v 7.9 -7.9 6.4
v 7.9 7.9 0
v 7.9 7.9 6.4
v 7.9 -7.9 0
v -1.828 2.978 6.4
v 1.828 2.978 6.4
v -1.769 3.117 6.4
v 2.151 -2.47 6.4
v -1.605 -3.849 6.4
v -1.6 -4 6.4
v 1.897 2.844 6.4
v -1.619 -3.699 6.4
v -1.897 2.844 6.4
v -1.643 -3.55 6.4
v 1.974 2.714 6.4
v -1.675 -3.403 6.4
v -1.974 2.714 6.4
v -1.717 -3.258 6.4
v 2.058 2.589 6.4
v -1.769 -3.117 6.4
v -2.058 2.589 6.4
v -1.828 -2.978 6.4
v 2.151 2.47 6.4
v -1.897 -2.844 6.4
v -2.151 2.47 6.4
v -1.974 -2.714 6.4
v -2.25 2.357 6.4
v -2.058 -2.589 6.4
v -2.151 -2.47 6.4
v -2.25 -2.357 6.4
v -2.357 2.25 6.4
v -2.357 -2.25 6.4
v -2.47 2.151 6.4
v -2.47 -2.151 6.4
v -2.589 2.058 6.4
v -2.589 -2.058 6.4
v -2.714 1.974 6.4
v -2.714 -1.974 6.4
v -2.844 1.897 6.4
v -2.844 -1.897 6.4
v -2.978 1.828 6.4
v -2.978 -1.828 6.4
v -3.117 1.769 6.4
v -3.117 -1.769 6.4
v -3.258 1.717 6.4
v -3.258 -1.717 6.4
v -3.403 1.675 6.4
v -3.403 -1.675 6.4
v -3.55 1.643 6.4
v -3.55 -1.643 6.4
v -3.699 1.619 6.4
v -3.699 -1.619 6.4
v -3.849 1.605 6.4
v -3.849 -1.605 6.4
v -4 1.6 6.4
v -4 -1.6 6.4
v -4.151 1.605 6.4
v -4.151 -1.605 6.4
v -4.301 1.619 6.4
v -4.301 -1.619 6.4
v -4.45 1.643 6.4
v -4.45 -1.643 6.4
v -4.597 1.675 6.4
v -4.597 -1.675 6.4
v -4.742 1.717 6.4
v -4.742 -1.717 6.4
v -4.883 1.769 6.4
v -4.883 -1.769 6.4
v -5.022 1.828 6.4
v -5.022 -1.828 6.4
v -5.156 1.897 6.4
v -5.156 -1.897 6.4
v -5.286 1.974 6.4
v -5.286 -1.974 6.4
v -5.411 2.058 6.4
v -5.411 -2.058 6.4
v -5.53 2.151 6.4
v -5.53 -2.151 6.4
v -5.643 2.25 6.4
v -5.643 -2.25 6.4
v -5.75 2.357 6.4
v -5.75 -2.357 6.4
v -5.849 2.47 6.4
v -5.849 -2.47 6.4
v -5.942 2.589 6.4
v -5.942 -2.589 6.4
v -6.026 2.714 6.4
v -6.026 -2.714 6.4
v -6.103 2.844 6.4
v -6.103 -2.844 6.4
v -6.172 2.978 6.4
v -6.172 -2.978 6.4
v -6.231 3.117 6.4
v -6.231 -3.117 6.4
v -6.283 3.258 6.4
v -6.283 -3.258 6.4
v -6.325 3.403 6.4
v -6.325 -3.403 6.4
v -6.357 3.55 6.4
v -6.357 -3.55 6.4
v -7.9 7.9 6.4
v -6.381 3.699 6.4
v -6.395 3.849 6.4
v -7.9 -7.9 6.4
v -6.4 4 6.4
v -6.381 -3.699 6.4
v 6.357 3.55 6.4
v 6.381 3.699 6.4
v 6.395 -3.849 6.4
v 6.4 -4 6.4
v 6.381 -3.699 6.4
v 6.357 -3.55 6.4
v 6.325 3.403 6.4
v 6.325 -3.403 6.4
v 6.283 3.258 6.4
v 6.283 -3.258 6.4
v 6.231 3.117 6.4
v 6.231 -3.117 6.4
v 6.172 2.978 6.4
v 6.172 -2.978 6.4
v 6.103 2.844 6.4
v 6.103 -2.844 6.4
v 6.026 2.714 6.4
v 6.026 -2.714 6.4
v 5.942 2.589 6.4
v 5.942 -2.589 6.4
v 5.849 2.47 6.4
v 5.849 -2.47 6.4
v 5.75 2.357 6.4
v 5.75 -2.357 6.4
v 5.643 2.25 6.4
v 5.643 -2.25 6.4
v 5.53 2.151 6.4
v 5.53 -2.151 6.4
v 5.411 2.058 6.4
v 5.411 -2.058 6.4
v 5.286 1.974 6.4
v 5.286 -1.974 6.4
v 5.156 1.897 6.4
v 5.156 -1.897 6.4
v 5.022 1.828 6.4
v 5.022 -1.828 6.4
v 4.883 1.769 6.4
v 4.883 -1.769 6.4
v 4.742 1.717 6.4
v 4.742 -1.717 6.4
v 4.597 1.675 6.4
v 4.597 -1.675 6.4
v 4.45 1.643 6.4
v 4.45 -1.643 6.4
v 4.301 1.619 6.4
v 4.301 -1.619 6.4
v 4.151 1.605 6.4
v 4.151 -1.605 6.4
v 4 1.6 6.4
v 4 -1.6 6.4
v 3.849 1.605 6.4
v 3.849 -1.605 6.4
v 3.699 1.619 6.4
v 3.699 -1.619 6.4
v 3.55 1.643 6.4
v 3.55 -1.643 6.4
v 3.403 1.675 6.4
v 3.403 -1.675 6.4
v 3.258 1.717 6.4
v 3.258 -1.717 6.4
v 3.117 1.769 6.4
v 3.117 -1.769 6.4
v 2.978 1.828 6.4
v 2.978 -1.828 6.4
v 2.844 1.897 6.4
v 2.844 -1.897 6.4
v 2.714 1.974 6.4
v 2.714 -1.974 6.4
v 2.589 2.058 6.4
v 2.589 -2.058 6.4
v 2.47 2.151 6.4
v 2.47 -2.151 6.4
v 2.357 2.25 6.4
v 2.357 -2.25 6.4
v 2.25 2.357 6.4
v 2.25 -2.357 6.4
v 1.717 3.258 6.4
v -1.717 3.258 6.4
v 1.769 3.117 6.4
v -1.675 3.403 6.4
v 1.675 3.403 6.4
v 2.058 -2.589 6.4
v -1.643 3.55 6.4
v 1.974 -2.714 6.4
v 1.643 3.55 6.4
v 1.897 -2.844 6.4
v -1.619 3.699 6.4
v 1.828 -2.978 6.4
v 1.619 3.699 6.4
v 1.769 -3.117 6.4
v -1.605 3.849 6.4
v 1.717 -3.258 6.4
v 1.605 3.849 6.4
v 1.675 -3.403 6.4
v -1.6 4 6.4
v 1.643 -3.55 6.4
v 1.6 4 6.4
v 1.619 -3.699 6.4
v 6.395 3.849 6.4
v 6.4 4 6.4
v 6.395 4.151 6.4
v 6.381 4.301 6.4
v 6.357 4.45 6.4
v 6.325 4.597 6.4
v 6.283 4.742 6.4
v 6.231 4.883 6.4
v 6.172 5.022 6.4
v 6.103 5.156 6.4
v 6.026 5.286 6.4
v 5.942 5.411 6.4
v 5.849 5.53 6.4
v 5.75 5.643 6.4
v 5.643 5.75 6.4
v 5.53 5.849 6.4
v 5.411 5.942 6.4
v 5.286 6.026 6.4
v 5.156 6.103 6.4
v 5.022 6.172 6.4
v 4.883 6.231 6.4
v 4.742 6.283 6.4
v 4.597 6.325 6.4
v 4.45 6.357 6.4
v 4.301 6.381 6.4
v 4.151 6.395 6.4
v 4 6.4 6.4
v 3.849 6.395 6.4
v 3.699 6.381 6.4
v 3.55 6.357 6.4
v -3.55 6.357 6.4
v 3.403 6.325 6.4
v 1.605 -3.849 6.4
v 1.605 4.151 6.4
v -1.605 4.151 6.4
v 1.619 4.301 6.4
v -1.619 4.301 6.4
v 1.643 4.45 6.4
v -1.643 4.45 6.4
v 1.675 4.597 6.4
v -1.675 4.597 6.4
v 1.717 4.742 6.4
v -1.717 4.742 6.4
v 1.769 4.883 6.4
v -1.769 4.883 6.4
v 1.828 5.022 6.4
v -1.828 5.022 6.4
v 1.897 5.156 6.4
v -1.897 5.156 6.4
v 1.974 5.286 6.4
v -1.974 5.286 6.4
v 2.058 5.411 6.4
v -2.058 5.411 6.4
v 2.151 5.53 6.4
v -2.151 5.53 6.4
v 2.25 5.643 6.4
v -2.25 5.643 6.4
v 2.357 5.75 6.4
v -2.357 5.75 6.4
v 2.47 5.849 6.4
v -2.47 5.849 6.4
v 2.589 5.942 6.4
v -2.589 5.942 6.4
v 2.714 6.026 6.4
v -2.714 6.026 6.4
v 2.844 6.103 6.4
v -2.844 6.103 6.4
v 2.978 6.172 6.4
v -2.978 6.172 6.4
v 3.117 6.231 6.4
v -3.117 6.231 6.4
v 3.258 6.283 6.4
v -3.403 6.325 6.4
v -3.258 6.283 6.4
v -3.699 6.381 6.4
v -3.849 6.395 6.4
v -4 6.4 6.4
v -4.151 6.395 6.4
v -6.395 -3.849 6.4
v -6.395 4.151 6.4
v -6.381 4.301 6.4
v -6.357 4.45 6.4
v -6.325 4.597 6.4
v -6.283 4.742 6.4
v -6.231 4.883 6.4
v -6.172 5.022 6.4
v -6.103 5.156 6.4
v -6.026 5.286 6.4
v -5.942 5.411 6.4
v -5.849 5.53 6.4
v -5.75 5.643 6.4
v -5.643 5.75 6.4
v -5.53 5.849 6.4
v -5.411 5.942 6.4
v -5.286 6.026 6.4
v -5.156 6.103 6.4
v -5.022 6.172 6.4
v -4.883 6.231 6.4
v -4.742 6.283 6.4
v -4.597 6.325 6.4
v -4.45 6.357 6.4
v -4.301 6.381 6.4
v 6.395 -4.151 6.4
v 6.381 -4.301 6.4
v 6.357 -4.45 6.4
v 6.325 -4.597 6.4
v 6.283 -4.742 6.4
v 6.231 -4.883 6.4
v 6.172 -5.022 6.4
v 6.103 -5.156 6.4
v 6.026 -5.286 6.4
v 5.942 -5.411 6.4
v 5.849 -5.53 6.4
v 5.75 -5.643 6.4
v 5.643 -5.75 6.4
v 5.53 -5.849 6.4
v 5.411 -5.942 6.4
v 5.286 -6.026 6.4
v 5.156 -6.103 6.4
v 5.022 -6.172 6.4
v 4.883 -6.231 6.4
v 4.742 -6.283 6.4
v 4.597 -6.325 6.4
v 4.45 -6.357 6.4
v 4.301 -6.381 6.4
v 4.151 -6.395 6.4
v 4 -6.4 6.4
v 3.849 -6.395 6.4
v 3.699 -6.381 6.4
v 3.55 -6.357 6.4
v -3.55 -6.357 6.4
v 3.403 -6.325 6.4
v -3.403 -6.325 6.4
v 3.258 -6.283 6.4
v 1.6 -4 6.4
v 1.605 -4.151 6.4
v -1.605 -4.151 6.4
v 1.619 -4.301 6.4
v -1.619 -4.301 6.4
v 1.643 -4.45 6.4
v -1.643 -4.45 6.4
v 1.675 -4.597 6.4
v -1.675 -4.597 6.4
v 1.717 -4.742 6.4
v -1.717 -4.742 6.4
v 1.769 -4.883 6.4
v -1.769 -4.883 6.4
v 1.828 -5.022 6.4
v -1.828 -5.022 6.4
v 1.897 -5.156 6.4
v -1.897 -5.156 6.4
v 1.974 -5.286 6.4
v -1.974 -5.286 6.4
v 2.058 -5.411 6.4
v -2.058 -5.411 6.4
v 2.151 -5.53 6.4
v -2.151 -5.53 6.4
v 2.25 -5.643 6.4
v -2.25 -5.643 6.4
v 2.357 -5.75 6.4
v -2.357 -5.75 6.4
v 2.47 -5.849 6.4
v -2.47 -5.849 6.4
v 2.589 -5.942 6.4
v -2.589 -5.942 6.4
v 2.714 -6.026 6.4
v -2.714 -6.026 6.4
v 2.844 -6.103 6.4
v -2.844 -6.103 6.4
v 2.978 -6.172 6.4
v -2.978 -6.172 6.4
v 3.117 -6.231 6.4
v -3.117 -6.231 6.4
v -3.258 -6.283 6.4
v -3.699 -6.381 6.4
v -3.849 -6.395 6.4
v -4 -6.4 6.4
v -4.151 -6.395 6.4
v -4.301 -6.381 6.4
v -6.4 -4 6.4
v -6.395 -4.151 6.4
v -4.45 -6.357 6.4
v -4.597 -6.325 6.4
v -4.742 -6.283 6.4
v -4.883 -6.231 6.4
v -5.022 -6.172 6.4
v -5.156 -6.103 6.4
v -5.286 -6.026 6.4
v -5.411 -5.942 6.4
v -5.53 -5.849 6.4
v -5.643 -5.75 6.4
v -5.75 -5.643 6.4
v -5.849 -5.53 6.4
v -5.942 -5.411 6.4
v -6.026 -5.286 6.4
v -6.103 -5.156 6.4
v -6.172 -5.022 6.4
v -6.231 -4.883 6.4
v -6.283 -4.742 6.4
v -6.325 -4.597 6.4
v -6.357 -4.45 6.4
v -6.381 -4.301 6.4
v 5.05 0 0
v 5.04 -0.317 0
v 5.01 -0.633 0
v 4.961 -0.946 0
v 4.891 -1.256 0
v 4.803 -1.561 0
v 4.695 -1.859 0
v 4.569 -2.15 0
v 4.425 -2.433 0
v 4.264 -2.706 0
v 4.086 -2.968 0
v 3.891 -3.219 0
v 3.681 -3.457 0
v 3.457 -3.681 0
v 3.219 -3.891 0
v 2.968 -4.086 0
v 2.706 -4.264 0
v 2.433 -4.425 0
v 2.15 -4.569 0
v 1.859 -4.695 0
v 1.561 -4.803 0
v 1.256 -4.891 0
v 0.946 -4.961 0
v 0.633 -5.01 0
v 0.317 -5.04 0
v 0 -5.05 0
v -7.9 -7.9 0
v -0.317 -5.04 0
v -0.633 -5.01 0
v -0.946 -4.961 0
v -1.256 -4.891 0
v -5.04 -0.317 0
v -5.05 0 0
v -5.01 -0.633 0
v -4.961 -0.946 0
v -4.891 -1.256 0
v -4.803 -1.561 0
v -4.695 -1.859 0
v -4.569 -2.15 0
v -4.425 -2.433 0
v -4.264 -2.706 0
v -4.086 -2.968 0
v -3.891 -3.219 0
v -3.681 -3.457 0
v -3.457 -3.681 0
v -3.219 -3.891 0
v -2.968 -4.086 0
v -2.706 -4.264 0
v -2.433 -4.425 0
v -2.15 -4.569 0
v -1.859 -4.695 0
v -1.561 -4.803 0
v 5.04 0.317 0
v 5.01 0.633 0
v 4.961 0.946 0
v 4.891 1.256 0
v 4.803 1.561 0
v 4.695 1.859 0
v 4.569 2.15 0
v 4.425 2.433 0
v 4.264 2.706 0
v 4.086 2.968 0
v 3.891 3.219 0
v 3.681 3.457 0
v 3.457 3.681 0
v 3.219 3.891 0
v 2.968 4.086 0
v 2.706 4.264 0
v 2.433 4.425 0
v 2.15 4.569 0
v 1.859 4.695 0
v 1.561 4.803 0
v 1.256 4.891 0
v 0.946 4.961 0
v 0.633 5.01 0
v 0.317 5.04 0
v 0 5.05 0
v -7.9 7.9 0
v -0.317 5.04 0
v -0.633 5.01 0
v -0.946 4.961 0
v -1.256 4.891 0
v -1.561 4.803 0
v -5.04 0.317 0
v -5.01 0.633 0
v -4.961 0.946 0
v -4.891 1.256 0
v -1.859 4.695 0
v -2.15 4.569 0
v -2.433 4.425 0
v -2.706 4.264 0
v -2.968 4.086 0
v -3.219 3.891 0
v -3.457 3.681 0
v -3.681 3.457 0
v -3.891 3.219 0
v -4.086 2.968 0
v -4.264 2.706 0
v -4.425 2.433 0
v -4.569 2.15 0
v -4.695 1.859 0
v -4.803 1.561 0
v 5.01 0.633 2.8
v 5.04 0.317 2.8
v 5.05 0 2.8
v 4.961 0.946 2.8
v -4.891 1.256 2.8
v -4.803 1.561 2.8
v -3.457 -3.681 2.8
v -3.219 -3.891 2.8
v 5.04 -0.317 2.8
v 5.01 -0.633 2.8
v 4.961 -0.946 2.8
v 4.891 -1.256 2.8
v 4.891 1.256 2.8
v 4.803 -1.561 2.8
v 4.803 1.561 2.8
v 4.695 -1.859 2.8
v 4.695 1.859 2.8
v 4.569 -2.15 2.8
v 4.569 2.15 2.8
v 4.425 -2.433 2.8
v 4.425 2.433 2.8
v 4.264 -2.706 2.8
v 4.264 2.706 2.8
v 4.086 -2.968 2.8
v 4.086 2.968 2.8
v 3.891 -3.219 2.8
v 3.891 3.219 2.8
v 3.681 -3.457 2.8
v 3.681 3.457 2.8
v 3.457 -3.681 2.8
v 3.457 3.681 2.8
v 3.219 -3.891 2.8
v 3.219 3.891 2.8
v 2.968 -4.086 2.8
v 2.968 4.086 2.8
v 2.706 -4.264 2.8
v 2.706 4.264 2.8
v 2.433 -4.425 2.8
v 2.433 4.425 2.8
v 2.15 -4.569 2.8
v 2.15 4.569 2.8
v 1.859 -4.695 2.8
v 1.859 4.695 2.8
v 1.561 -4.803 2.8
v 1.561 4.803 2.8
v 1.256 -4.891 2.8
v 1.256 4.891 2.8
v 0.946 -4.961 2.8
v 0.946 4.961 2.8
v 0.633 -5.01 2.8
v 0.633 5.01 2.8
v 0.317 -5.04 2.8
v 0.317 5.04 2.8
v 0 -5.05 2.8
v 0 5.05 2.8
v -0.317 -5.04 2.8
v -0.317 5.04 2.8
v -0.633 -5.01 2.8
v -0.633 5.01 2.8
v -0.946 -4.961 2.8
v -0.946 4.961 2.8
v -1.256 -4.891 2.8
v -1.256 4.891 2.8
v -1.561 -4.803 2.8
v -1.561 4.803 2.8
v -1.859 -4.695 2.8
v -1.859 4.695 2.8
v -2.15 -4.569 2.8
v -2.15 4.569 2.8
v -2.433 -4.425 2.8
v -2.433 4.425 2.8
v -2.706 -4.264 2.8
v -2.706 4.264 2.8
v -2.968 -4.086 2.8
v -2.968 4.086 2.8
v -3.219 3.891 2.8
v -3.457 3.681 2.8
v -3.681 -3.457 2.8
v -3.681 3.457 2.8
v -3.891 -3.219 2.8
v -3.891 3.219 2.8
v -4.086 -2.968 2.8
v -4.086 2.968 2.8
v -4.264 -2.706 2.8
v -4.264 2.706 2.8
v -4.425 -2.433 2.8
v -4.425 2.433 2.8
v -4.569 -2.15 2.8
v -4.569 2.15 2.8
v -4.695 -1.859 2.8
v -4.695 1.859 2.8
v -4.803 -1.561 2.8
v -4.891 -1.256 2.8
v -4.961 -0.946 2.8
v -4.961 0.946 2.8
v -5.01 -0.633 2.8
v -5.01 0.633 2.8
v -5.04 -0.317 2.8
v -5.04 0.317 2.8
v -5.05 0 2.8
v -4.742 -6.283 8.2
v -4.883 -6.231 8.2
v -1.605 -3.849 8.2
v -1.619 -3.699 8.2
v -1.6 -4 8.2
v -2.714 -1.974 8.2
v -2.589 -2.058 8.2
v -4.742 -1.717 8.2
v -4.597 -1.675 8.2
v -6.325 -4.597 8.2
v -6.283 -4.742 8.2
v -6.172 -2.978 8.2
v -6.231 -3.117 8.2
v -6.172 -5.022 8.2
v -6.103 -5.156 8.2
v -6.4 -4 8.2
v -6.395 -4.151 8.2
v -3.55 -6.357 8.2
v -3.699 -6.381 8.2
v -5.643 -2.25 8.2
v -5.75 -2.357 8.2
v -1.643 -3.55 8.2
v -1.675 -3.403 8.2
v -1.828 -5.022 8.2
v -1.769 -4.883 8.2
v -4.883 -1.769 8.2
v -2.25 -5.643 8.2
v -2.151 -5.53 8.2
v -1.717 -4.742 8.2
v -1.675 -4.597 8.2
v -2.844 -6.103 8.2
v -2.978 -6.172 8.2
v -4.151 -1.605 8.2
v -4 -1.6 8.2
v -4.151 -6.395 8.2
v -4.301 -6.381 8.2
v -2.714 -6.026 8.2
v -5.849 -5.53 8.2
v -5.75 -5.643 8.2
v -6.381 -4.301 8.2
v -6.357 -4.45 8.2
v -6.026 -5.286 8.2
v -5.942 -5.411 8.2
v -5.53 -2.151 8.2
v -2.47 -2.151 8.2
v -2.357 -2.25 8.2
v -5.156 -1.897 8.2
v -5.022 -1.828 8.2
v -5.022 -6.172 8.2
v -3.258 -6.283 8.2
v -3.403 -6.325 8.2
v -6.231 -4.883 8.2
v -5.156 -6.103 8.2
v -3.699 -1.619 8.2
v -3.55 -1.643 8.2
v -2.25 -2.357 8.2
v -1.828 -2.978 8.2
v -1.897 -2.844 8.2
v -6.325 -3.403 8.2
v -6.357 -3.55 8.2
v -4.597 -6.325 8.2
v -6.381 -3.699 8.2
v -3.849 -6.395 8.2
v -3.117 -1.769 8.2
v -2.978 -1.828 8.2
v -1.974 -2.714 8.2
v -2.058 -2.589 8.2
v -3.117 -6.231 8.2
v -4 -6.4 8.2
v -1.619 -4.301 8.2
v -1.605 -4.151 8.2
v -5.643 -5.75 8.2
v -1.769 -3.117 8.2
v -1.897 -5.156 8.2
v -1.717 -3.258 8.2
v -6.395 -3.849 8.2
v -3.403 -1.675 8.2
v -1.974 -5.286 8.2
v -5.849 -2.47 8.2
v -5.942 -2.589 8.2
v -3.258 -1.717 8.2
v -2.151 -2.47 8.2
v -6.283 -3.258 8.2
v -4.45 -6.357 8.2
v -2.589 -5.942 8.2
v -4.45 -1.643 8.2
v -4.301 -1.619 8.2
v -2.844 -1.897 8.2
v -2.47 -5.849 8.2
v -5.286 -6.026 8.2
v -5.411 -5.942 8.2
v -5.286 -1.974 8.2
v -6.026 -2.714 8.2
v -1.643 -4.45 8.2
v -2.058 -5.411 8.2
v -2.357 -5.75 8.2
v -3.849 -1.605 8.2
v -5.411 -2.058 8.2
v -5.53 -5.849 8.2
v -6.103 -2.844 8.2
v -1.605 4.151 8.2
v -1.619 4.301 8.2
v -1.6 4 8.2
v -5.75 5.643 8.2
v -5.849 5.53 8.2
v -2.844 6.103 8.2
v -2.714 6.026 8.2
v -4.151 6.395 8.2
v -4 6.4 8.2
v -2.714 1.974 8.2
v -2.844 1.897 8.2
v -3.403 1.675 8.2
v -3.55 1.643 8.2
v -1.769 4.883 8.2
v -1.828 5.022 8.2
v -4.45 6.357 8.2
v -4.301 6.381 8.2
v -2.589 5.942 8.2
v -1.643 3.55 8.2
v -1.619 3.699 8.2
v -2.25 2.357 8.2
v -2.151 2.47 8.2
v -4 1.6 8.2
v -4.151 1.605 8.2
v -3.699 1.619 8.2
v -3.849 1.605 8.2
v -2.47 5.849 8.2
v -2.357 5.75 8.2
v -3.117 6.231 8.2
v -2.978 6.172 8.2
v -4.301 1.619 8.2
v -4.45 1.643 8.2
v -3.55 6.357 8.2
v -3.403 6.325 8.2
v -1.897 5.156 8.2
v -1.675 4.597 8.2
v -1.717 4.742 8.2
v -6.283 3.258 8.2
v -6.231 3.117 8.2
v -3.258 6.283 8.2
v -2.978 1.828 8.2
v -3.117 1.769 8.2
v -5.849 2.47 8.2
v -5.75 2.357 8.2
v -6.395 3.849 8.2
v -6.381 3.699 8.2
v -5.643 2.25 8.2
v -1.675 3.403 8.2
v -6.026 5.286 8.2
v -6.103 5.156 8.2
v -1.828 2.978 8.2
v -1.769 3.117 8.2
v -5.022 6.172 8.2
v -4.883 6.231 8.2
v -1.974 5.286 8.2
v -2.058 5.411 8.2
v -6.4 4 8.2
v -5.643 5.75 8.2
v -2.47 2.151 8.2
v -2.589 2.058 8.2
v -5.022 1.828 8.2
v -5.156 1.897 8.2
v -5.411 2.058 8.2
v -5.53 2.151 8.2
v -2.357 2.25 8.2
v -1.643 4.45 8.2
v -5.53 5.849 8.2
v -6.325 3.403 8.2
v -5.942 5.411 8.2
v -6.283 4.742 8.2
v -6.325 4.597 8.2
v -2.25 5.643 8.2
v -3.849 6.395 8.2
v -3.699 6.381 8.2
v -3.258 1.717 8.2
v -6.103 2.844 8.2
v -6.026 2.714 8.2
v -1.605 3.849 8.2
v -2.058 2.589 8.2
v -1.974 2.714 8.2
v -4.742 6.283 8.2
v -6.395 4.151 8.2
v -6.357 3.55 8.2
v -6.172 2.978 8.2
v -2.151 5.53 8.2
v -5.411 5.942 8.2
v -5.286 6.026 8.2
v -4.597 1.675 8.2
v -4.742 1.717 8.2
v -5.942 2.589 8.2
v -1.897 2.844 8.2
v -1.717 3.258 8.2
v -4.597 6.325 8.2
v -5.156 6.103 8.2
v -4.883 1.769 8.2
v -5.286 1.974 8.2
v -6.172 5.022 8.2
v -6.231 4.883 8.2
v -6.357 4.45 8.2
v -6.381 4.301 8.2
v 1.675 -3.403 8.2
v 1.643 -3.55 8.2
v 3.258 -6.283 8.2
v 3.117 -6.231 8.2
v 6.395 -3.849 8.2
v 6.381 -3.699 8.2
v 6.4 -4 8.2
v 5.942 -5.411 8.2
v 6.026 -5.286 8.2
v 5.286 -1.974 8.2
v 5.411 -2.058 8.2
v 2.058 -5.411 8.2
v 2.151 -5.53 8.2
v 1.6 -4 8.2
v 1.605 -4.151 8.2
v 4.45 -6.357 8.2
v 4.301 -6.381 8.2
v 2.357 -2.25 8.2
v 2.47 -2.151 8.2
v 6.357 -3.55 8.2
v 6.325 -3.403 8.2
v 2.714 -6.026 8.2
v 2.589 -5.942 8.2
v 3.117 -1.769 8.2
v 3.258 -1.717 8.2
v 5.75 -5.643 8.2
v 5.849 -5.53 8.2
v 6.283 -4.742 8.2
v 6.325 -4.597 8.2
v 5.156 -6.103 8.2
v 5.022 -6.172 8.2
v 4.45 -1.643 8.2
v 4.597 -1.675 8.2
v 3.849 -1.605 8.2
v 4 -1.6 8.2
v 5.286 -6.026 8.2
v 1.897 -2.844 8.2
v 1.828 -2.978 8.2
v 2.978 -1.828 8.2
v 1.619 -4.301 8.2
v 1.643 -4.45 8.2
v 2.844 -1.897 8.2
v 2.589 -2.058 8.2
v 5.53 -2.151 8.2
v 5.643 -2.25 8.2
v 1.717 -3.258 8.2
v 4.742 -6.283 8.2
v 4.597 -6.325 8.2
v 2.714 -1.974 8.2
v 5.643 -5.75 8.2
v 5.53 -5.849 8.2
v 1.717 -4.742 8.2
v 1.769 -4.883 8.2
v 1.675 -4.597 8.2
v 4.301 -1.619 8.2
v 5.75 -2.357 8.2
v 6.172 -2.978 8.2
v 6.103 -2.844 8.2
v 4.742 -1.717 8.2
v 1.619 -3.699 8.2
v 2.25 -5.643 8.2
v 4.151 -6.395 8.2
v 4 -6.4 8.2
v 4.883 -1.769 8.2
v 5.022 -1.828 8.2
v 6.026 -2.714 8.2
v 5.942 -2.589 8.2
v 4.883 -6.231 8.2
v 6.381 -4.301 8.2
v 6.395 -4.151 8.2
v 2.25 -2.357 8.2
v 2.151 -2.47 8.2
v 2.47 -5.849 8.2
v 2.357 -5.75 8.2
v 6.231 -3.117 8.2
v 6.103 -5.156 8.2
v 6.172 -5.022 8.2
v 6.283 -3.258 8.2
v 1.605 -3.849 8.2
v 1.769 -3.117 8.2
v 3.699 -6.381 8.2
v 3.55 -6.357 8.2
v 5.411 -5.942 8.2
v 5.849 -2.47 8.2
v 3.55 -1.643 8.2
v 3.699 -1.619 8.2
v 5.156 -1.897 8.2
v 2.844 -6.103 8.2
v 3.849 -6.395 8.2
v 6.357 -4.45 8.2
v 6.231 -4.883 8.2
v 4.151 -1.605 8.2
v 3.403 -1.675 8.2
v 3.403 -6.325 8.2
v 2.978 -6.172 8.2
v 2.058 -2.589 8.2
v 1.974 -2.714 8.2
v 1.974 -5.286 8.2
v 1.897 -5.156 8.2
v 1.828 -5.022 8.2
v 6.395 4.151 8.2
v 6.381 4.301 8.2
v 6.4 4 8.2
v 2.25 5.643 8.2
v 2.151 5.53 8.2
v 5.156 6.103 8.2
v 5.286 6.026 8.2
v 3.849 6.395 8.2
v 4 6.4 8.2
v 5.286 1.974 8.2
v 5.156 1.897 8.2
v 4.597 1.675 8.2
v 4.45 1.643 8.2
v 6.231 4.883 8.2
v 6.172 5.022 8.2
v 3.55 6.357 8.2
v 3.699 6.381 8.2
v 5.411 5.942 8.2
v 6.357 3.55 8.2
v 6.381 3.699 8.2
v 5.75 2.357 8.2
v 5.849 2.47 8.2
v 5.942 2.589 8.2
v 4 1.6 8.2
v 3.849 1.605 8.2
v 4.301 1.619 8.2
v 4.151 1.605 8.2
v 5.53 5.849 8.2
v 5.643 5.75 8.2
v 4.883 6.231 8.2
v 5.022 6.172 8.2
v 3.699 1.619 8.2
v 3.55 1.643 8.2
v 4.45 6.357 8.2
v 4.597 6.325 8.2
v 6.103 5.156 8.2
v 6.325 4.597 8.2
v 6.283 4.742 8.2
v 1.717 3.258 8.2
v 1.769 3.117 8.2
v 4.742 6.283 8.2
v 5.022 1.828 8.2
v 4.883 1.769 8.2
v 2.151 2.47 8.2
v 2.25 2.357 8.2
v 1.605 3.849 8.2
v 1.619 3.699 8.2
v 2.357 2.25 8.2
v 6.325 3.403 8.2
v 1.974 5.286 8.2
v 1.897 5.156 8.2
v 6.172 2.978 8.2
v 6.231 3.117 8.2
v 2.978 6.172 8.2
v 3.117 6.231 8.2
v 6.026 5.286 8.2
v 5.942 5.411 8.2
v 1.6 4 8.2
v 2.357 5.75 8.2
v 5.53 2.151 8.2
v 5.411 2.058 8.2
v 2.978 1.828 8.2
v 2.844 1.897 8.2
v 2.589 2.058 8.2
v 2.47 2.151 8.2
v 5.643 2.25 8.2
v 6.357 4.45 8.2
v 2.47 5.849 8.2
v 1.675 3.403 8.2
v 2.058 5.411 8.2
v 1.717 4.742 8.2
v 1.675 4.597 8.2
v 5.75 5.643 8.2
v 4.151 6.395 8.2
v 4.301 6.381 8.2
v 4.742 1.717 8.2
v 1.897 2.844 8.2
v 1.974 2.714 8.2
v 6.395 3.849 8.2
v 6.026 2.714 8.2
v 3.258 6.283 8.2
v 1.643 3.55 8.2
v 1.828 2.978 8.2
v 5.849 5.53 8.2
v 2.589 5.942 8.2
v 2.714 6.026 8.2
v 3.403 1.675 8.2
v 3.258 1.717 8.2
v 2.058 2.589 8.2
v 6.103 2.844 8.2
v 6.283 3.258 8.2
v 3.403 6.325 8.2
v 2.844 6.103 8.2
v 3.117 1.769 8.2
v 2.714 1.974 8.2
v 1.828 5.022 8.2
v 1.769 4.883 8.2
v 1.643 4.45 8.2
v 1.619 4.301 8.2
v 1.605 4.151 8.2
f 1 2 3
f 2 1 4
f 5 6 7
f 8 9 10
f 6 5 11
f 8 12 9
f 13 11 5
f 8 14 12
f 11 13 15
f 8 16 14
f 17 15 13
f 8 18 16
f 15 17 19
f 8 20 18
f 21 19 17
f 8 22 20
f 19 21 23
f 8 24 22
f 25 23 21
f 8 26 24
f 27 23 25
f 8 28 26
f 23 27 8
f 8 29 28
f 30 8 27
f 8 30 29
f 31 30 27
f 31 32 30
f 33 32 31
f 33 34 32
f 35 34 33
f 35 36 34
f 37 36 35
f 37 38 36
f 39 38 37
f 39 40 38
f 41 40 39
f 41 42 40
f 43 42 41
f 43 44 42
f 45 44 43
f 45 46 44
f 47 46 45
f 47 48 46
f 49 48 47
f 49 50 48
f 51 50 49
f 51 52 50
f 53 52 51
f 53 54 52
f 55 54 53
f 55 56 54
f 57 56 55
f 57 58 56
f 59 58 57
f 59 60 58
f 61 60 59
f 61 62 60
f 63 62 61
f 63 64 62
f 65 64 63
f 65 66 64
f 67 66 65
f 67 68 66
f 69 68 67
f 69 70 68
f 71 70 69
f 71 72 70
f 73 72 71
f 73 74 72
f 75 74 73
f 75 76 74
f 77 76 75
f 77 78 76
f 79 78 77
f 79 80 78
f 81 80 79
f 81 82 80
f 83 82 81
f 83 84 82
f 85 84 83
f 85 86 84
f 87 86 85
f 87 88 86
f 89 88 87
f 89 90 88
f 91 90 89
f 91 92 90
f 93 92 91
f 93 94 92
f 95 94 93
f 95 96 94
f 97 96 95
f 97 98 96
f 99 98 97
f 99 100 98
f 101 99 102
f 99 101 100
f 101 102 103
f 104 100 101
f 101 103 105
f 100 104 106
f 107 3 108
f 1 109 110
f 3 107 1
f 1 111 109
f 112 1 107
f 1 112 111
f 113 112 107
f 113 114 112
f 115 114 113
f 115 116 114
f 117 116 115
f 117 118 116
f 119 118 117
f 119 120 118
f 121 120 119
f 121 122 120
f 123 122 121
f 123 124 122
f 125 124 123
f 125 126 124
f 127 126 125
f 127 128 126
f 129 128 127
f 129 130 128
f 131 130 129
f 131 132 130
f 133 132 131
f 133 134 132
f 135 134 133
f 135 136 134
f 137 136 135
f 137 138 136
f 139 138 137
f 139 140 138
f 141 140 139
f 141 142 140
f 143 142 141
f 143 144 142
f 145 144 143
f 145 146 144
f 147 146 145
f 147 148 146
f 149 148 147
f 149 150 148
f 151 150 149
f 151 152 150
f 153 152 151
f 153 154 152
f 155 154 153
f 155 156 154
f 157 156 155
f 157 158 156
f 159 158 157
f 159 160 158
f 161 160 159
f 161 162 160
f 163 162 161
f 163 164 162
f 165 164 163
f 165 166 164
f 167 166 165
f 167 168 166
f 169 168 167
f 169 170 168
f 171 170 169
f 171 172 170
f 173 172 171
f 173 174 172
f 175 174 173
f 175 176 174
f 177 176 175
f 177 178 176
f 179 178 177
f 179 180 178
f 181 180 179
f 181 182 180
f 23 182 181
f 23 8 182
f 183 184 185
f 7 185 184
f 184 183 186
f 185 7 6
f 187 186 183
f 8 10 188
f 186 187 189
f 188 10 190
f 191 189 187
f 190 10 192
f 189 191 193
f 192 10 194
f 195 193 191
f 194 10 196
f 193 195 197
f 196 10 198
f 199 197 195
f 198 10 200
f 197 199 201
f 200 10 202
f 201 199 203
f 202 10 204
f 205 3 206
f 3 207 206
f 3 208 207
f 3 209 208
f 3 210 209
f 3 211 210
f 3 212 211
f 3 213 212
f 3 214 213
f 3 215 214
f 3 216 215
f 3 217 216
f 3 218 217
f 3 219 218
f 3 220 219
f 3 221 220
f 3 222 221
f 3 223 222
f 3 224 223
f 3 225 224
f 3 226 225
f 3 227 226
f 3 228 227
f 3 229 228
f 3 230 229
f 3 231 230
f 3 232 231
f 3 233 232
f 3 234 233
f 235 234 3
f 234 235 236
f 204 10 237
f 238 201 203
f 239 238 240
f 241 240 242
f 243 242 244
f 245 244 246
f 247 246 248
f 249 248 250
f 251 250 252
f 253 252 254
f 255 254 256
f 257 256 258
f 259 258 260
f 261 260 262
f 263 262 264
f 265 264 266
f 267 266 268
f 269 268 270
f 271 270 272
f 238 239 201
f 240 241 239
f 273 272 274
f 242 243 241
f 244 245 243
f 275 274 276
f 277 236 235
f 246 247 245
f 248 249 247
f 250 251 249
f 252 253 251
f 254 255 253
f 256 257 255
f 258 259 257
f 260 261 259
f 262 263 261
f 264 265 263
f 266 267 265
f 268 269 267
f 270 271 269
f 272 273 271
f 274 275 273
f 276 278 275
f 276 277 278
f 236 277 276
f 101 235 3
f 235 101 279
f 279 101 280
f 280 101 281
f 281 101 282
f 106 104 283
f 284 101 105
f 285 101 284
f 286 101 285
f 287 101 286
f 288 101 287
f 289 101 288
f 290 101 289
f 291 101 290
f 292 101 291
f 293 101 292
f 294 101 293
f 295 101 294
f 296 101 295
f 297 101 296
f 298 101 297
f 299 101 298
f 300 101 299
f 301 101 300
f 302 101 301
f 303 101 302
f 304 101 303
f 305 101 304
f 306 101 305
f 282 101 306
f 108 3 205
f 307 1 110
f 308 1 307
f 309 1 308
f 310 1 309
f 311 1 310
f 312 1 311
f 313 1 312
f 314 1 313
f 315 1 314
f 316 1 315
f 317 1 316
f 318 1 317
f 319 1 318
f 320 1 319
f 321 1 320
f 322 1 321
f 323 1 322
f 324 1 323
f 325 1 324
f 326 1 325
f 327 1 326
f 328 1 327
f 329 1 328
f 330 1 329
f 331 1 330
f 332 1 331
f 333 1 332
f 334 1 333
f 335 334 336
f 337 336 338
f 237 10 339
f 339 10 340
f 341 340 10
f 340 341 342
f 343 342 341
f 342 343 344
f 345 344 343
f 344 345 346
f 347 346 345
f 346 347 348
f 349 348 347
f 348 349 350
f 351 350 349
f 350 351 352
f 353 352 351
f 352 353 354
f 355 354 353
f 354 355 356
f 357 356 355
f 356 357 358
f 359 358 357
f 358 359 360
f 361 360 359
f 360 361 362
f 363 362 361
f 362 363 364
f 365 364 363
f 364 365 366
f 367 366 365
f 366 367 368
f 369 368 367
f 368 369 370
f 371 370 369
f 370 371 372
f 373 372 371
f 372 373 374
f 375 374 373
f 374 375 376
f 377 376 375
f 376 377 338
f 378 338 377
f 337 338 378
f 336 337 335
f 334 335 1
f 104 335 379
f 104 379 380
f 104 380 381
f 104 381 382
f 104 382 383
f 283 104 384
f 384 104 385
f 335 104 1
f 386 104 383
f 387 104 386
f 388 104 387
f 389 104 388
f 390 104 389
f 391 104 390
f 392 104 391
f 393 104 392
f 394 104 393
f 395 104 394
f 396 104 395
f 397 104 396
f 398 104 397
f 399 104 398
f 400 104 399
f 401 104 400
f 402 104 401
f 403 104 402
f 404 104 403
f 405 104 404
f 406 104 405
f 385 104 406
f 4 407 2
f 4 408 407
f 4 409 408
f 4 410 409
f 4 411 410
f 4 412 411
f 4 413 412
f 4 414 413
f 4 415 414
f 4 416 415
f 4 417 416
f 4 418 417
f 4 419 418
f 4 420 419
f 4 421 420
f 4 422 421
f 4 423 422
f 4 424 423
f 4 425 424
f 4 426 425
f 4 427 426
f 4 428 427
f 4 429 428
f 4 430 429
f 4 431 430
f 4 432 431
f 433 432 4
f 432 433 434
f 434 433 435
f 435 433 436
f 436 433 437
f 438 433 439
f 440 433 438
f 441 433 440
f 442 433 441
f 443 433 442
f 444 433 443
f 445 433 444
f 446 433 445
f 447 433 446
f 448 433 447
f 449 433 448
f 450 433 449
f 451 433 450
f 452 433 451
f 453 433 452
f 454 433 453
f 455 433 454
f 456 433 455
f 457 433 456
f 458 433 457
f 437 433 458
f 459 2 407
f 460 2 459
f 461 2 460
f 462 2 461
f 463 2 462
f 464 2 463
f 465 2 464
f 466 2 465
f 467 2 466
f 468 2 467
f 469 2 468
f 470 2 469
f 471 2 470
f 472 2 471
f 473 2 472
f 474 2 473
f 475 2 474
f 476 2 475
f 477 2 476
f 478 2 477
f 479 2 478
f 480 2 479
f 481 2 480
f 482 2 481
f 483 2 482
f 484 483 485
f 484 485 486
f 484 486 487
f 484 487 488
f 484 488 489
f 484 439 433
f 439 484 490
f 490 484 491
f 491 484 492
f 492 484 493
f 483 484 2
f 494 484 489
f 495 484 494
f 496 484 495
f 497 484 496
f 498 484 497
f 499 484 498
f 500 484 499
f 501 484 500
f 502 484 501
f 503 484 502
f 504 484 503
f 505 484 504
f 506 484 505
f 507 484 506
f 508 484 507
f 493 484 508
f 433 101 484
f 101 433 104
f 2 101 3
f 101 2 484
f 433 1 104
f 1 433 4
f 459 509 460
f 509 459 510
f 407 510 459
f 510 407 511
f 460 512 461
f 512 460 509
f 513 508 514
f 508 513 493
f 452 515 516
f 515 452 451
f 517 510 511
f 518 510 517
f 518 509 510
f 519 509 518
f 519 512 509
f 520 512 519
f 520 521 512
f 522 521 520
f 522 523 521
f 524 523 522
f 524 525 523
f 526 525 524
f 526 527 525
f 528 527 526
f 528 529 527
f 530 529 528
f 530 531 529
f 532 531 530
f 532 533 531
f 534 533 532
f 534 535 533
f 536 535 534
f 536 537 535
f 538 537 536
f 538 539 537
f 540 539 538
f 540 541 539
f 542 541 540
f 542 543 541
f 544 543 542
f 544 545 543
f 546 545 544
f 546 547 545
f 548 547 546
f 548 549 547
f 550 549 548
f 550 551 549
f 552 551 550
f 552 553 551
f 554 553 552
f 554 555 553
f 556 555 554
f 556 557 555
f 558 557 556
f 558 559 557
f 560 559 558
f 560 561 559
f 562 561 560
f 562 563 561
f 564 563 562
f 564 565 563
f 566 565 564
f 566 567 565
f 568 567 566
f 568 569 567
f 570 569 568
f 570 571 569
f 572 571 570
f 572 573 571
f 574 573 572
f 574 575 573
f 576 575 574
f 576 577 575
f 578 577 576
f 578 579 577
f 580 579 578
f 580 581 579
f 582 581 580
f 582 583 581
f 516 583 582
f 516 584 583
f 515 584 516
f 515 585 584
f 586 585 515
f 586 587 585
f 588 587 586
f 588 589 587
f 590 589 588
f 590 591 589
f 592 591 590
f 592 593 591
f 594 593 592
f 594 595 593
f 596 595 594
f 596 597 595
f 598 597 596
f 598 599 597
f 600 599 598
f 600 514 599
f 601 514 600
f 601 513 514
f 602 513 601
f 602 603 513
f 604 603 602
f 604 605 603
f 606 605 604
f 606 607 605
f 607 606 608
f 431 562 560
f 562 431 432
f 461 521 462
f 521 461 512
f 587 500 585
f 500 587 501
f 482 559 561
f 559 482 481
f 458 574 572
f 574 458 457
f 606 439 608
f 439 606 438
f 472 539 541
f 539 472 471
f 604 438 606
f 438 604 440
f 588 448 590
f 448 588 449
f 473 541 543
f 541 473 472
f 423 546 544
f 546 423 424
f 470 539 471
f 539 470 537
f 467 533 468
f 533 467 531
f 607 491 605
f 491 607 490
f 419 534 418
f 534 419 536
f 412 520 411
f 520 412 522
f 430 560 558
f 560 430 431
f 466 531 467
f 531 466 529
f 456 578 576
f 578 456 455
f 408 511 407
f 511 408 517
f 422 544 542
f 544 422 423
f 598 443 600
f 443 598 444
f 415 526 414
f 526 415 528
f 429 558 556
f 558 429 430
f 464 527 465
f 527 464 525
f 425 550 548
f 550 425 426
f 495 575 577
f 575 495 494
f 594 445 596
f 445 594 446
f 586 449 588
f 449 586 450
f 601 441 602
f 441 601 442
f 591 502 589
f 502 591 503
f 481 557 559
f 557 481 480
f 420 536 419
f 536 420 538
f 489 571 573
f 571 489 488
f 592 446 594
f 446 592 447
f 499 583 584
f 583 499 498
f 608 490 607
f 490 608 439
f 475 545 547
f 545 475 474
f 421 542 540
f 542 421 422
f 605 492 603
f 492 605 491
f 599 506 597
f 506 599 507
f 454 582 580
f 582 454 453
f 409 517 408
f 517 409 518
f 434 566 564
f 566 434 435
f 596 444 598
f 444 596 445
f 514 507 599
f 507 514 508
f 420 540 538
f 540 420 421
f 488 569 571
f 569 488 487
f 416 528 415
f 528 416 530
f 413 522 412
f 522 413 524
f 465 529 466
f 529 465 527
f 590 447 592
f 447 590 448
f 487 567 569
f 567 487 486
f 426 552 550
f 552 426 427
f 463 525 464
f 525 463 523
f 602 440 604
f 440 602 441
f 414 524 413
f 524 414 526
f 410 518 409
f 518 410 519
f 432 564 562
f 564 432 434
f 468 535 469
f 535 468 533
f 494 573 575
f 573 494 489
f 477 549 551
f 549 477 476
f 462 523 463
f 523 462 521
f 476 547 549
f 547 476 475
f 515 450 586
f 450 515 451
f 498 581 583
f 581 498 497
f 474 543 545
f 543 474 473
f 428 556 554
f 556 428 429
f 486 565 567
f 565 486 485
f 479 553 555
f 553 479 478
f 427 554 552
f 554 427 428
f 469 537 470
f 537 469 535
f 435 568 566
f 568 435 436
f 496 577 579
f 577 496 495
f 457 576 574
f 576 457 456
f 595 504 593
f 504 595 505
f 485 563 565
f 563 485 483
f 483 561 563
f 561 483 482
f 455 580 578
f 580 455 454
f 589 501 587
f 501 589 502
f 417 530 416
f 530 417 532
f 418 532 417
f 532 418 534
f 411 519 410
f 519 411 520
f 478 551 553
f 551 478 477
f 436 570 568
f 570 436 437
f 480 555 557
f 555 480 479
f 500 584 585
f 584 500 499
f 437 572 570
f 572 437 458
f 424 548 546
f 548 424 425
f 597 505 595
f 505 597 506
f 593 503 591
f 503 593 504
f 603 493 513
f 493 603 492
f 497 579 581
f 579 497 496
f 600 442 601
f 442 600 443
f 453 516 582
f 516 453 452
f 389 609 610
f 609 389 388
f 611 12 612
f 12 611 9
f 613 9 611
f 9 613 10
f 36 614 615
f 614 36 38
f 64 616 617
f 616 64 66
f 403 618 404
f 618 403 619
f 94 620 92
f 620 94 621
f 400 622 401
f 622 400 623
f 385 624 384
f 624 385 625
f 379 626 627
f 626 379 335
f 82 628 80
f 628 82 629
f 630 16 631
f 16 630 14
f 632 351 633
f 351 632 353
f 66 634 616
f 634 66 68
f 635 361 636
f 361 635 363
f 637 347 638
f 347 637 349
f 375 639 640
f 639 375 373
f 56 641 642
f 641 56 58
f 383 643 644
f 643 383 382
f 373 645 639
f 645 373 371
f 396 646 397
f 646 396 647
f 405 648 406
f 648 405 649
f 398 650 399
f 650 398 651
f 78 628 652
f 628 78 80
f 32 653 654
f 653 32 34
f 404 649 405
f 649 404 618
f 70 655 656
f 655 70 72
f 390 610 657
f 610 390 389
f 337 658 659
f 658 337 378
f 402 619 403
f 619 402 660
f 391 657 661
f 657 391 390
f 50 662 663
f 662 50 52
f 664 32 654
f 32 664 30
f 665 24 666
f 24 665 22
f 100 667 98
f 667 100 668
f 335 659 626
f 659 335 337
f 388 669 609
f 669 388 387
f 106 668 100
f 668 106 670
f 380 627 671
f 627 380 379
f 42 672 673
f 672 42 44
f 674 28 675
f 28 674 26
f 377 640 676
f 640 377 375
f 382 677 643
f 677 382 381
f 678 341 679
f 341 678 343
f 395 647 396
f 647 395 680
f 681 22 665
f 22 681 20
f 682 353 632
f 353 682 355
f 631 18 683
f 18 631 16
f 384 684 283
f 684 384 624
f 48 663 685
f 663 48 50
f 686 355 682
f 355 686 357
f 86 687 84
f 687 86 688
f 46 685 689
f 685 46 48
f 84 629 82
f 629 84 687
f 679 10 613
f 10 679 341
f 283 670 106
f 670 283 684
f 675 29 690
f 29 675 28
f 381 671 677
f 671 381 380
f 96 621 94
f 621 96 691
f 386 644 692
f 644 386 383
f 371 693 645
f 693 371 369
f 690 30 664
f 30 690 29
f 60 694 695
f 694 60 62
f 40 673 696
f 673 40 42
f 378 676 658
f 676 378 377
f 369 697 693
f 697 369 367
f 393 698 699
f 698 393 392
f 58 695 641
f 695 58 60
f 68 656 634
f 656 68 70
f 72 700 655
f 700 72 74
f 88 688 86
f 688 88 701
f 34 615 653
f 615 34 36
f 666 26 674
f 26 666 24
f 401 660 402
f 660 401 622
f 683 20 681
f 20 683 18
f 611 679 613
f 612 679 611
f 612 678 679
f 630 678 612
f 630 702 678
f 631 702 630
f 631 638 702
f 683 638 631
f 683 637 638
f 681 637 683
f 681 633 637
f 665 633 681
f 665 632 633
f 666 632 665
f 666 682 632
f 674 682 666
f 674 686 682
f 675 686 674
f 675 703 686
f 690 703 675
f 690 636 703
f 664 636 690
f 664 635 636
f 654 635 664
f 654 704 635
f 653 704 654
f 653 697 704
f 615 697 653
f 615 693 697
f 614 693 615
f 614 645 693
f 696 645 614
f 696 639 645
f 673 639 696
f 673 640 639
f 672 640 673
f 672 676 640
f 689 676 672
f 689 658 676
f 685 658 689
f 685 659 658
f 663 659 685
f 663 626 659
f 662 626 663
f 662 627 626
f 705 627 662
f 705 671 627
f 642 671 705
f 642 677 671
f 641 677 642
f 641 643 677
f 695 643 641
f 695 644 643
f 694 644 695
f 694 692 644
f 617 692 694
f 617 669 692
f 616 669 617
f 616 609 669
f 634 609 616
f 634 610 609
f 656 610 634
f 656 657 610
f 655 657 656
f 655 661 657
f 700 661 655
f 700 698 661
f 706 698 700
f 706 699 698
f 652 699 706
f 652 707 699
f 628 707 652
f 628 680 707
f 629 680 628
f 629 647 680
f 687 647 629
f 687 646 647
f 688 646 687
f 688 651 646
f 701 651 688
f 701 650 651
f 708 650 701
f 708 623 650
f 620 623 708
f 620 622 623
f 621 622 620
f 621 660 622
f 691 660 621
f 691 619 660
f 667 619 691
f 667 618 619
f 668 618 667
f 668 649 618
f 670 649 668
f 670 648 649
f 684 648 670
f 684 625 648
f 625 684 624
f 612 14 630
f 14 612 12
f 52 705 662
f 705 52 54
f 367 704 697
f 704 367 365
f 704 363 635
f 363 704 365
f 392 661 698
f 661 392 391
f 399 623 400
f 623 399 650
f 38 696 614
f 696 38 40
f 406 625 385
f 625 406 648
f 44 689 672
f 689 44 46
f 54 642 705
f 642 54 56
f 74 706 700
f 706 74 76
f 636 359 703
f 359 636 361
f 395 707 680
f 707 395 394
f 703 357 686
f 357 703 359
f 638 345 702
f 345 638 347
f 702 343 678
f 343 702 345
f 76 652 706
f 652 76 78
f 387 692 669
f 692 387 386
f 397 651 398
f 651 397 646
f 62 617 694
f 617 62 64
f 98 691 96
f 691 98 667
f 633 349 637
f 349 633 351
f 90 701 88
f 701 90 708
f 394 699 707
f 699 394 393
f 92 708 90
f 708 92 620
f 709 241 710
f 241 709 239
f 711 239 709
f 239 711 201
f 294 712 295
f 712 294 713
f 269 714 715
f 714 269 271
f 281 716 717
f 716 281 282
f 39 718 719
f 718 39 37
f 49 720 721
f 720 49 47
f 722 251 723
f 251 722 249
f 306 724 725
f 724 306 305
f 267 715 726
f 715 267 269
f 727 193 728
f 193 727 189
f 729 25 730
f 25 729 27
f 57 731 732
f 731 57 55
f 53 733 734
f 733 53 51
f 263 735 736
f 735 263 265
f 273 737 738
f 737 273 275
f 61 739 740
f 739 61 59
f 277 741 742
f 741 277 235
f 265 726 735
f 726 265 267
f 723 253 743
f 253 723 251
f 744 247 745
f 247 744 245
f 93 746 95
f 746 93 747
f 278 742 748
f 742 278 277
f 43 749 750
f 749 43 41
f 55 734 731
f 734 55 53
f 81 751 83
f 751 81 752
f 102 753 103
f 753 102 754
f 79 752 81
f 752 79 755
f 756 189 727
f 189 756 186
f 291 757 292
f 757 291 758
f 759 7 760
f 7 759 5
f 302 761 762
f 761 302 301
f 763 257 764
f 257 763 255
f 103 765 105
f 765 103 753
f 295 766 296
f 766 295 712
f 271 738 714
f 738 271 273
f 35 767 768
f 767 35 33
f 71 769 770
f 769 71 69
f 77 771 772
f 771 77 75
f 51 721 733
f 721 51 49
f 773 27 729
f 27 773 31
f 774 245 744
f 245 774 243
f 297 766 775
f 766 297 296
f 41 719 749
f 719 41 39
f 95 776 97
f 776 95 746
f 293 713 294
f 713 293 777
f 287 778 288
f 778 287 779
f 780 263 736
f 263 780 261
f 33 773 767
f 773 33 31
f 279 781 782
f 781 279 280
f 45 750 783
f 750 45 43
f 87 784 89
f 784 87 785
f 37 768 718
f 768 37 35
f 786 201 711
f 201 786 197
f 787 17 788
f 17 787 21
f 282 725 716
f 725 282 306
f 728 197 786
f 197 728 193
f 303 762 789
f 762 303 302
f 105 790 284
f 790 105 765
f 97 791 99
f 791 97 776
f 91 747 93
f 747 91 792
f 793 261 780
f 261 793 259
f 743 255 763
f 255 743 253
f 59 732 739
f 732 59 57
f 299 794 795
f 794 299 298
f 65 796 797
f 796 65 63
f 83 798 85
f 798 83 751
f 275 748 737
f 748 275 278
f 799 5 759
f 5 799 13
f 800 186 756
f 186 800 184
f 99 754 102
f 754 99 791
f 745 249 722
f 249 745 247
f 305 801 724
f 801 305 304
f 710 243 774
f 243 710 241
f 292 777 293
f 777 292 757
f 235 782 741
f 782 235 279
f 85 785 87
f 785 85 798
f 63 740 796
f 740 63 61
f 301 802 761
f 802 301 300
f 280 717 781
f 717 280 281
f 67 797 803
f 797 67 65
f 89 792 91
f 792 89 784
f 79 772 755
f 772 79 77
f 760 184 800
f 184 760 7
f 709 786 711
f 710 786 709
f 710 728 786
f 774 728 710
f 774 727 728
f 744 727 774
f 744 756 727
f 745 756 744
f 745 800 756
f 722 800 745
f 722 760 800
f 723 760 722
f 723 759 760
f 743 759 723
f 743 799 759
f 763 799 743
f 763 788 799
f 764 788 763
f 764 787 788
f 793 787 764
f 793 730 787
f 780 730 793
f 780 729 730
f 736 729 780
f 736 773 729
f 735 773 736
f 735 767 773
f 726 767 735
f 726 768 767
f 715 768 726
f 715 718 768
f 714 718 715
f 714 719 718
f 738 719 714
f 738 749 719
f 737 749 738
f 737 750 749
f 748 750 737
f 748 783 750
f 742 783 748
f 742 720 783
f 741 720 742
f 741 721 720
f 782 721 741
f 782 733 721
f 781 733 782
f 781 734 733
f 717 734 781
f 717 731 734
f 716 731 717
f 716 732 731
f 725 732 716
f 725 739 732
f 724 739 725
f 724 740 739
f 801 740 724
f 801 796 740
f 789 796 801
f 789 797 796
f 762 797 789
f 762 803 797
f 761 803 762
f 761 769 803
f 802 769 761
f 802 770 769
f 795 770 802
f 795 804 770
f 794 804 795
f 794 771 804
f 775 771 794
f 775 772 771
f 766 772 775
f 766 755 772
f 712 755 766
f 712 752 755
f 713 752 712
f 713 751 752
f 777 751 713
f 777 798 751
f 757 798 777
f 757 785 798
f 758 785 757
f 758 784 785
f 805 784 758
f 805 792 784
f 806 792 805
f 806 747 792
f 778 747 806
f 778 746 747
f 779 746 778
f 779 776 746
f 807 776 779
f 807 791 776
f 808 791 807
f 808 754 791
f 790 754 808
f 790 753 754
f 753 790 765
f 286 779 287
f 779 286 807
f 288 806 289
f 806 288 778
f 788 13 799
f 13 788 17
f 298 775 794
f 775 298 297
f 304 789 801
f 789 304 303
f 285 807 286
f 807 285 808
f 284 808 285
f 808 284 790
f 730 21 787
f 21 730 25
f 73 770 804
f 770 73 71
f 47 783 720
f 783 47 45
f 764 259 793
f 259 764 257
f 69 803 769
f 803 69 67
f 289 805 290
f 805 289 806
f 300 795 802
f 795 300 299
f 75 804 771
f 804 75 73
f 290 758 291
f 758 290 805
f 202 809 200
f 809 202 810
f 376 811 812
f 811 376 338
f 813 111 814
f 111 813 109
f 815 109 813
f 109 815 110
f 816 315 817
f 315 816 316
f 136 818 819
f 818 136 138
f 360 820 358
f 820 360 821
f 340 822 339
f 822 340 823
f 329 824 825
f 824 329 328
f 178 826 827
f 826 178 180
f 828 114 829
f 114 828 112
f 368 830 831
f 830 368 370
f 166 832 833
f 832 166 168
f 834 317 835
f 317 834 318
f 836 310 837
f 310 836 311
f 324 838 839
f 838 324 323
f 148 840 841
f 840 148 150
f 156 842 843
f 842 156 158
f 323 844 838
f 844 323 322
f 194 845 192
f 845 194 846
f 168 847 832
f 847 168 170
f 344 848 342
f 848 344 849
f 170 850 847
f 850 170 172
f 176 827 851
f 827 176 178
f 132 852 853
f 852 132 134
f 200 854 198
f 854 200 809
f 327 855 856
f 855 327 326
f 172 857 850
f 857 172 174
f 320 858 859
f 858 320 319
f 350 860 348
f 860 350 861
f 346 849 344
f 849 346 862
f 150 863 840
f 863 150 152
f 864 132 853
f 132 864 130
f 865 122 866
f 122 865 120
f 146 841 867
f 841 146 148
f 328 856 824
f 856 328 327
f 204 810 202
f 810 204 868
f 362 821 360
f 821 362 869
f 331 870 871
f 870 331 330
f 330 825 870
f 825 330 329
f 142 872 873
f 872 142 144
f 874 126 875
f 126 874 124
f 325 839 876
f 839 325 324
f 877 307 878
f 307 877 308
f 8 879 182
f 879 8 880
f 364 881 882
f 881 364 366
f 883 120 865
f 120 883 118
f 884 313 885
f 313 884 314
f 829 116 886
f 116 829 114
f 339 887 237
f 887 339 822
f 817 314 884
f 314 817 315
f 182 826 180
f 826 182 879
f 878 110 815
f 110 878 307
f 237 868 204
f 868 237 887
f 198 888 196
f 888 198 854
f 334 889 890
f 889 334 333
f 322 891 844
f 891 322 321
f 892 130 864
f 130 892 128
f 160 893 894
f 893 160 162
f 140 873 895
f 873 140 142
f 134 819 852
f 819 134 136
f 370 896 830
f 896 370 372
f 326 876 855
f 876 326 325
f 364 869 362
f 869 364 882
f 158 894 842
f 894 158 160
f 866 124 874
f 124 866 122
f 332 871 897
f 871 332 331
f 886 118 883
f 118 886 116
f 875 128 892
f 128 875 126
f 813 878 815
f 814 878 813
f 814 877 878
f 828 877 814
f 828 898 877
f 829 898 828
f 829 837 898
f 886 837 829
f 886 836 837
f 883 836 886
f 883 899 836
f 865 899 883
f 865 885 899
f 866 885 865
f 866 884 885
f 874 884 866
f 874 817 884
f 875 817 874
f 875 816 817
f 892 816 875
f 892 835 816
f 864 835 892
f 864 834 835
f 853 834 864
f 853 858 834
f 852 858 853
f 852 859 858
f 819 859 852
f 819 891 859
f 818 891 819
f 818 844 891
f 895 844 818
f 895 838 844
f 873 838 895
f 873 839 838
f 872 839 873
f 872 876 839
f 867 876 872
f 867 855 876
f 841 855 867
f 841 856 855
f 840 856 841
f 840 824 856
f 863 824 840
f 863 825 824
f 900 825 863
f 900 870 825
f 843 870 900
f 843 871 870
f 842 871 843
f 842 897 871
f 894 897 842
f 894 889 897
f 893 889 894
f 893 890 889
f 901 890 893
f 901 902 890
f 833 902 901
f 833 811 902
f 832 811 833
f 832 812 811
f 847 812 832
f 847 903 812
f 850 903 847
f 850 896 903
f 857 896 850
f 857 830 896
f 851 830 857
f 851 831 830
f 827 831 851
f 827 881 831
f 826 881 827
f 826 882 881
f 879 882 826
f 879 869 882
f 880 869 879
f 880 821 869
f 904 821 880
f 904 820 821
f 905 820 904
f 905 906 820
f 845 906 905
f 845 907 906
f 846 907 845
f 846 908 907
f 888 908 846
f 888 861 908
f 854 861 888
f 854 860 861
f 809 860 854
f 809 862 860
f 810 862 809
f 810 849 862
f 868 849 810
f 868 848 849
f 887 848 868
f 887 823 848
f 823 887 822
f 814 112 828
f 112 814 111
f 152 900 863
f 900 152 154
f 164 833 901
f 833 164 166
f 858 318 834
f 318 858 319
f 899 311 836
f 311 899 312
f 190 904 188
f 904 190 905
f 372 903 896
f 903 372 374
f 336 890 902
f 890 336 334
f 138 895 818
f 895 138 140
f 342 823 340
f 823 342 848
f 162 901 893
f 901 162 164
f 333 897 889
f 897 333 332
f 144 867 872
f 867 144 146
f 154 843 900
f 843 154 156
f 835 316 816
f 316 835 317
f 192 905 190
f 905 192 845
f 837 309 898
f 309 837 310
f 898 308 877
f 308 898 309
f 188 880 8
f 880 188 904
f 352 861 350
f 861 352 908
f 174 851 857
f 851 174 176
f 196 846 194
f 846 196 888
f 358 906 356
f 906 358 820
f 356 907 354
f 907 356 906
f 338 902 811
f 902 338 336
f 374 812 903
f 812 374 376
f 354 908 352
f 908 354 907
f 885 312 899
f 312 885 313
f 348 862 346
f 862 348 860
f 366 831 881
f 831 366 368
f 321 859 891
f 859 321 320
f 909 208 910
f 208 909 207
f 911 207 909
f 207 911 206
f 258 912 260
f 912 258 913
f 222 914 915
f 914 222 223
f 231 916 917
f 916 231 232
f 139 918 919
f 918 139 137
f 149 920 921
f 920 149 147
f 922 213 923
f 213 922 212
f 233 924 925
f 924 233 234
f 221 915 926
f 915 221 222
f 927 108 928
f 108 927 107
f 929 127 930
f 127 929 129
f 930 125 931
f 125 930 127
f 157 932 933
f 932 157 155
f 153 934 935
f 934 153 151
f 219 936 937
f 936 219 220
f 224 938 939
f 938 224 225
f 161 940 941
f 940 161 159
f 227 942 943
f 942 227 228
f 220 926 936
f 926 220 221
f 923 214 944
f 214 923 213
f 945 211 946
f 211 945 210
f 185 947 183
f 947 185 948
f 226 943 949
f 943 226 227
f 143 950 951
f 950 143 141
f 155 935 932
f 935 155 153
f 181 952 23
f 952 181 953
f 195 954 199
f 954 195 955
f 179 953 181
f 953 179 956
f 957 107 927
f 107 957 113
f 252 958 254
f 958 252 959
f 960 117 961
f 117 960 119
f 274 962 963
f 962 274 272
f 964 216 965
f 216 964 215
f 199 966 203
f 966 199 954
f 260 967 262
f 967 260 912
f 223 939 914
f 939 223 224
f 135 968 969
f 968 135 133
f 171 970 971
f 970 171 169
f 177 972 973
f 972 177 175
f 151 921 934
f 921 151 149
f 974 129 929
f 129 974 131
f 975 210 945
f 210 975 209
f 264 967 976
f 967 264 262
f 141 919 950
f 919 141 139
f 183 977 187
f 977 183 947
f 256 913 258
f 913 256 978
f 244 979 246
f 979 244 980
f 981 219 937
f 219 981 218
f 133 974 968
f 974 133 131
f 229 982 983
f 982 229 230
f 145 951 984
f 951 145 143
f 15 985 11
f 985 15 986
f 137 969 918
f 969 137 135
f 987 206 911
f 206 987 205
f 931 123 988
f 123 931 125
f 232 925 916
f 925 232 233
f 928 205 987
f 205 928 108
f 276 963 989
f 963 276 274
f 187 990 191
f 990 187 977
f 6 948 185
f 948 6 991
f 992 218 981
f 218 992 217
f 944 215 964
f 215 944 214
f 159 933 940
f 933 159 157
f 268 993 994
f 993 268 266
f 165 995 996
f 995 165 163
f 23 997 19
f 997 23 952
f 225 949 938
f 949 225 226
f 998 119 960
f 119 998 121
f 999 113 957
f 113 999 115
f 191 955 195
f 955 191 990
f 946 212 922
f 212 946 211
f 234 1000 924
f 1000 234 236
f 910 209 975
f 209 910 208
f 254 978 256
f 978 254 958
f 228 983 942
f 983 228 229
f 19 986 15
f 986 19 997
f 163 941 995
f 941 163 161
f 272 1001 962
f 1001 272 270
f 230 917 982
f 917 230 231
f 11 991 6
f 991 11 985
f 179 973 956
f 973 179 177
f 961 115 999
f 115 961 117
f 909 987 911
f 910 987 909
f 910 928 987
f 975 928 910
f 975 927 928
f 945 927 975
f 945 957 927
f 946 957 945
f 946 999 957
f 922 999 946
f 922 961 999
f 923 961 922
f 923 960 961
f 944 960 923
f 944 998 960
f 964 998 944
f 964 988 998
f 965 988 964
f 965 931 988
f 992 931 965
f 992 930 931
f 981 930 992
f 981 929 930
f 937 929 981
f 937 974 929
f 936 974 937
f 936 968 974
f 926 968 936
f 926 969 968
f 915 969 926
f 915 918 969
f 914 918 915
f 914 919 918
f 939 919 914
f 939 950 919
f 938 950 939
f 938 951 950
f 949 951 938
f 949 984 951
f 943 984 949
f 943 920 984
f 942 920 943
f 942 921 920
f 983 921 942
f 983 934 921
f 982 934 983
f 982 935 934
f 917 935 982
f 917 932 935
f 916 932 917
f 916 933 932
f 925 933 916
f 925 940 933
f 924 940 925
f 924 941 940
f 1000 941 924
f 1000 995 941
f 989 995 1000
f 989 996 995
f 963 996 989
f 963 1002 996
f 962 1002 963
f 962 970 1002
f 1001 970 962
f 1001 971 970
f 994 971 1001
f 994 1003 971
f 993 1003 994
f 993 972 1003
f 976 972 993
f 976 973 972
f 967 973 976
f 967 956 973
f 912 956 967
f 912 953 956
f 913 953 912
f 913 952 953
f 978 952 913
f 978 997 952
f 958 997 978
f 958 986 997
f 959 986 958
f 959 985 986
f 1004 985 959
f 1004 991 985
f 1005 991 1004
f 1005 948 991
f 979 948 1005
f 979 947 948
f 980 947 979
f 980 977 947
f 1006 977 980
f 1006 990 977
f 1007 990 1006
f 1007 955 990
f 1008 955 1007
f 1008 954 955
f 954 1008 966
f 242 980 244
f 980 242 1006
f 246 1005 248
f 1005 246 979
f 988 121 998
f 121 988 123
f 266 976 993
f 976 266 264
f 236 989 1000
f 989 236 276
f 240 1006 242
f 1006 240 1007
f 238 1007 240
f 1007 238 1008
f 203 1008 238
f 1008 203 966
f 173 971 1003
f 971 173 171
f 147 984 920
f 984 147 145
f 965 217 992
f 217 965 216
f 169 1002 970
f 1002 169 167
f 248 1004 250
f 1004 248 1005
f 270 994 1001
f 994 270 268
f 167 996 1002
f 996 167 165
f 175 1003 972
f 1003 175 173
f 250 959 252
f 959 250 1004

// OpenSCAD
// file: lego_defs.scad
GAP =0.1;
STUD_DIST = 8;
STUD_DIAM = 4.8;
STUD_HEIGHT = 1.8;
HOLE_DIAM = 4.8;
HOLE_TOP_DIST = 9.6 - 5.8;
FLANGE_DIAM = 6.2;
FLANGE_DEPTH = 0.8 + GAP;;
PLATE_HEIGHT = 3.2;
// file: defs.scad
MAGNET_HEIGHT = 2.8;
MAGNET_DIAM = 10.1;
WALL_THICKNESS = 1;
TOP_THICKNESS = 1.5;
EDGE_RADIUS=1;
$fn=100;
// main file
include <defs.scad>
include <lego_defs.scad>

PLATE_COUNT_HEIGHT = 3;
MIN_TOP = 1;
top = PLATE_HEIGHT * ceil((MAGNET_HEIGHT + MIN_TOP) / PLATE_HEIGHT);
difference() {
  translate([-STUD_DIST+GAP,-STUD_DIST+GAP,0]) {
    cube([2*STUD_DIST-2*GAP, 2*STUD_DIST-2*GAP,top]);
  }
  cylinder(d=MAGNET_DIAM, h= MAGNET_HEIGHT);
 

}
for (x=[-STUD_DIST/2:STUD_DIST:STUD_DIST]) {
  for (y=[-STUD_DIST/2:STUD_DIST:STUD_DIST]) {
    translate([x,y,top]) {
      cylinder(d=STUD_DIAM, h=STUD_HEIGHT);
    }
  }
 }
